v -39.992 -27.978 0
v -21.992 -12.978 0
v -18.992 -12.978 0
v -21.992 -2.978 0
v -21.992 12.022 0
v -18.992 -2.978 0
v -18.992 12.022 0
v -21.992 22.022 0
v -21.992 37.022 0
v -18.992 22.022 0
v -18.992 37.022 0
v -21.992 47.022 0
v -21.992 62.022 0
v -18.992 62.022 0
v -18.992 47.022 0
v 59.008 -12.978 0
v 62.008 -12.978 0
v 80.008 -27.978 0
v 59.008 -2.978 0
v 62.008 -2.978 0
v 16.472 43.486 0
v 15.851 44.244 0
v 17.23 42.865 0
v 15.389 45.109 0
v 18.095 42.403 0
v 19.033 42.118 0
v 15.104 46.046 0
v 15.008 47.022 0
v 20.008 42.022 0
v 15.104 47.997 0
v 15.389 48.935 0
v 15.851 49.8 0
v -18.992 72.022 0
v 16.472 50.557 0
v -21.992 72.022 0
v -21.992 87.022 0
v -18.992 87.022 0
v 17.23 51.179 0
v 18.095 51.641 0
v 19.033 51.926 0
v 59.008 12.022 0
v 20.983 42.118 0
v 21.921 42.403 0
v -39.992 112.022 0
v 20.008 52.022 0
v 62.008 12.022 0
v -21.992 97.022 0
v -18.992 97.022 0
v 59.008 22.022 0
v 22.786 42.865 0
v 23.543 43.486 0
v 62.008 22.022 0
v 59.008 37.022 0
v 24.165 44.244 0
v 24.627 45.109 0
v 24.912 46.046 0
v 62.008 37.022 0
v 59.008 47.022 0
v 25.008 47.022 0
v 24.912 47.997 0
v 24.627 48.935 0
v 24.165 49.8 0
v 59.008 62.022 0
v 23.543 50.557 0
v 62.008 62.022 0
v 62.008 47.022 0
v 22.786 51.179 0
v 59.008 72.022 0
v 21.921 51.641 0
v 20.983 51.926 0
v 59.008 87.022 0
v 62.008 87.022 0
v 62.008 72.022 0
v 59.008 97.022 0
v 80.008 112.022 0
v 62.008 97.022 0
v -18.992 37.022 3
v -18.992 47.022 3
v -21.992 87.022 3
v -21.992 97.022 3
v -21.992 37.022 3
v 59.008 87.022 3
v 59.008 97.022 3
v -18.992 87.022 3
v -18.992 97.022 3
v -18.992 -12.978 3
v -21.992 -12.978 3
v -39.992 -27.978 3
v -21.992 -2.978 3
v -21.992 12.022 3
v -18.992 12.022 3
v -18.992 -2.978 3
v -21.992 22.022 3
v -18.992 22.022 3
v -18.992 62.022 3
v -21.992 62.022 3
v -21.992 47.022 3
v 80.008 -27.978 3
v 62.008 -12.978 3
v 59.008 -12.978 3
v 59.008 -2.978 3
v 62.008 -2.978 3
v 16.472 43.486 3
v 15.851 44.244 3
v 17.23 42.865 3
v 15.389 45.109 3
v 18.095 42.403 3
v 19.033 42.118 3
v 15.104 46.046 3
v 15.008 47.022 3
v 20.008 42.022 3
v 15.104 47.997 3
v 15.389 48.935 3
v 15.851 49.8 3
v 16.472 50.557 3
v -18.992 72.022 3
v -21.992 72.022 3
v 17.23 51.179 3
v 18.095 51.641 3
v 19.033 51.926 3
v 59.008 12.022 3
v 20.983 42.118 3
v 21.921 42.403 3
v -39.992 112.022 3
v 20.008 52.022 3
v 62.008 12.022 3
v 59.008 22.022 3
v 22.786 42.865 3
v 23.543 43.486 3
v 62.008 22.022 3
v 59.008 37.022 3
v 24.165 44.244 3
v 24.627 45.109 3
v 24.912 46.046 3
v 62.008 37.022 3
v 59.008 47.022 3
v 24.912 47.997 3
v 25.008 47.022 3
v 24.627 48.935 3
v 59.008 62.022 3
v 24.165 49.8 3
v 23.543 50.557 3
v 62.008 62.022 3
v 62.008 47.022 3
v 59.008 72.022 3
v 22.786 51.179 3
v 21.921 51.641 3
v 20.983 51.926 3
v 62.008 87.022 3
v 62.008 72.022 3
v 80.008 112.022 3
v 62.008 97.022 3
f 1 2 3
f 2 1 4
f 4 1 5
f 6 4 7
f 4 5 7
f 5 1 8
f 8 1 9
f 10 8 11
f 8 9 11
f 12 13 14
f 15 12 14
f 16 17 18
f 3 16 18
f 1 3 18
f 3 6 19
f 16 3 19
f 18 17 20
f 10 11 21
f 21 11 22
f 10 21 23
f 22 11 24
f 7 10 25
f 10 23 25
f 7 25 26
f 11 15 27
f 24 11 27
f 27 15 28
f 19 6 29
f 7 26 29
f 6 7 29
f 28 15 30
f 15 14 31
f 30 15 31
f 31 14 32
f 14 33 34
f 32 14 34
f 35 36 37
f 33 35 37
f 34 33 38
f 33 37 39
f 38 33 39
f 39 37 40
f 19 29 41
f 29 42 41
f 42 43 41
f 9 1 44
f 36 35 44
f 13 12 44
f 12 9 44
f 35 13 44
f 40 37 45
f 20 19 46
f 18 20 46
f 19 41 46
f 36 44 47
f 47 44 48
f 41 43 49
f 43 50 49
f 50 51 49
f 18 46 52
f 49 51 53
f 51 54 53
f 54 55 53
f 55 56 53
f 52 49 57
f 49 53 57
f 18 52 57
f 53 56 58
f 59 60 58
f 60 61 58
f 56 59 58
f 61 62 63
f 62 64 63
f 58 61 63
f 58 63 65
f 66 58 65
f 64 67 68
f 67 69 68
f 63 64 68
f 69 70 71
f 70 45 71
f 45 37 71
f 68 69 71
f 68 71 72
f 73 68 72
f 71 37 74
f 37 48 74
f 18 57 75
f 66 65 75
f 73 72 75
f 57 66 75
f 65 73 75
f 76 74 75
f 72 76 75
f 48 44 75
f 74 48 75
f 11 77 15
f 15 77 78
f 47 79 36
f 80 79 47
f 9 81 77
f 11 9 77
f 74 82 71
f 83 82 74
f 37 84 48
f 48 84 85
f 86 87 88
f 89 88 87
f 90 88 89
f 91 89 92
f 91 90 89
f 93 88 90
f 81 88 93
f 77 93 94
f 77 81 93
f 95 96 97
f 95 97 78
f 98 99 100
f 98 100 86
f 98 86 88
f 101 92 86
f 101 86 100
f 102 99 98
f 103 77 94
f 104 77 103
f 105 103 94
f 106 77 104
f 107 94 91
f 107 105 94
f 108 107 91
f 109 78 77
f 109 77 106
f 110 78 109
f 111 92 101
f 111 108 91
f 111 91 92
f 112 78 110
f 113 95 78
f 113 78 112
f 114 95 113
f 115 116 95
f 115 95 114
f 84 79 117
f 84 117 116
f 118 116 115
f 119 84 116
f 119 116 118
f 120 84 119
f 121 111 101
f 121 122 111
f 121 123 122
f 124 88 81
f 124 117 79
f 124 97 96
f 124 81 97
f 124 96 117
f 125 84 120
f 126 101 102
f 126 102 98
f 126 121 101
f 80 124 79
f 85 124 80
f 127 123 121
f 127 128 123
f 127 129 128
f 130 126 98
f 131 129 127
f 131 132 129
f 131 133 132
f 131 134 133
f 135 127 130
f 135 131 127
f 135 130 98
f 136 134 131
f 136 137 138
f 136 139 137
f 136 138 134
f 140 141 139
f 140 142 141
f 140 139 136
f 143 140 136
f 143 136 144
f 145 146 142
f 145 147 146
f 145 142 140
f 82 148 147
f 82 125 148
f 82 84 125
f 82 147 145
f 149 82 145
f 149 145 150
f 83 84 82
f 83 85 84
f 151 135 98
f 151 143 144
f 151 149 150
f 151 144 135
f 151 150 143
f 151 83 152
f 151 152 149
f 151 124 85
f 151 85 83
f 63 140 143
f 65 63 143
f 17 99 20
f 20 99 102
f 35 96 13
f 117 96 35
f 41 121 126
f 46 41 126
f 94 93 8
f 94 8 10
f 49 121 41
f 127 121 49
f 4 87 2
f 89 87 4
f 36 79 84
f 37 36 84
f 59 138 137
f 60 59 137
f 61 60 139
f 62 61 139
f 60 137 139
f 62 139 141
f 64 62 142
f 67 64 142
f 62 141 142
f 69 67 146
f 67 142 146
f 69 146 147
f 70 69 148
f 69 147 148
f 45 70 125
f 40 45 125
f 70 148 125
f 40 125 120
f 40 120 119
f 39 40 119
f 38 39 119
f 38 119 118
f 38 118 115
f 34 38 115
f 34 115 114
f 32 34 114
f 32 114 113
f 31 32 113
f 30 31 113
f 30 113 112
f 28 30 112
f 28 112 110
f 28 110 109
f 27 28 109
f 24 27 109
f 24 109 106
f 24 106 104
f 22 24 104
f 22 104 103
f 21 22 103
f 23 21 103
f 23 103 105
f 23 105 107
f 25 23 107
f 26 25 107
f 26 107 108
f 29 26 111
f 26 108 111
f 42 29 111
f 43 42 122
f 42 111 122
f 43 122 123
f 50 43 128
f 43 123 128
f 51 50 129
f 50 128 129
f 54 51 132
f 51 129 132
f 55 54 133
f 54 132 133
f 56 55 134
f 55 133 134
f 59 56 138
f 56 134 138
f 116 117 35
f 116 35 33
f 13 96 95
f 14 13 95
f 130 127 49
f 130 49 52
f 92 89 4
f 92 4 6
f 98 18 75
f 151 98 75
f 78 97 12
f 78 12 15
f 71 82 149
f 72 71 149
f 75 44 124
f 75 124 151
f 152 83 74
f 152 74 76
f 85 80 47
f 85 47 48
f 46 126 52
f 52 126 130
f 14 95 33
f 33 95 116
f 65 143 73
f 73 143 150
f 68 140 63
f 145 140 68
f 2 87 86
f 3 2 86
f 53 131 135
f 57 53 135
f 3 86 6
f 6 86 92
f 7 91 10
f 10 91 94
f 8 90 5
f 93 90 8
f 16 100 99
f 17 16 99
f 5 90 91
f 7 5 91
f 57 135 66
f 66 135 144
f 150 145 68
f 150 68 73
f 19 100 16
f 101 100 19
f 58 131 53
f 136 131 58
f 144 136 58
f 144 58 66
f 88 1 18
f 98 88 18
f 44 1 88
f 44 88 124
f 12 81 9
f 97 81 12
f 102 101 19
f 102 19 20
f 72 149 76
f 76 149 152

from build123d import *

# Parameters (mm, degrees)
ESQUISSE1_W             = 120
ESQUISSE1_H             = 140
BOSS_EXTRU_1_DEPTH      = 3
ESQUISSE3_R             = 5
ESQUISSE3_W             = 3
ESQUISSE3_H             = 10
ENL_V_MAT_EXTRU_1_DEPTH = 138.692369665


with BuildPart() as part:
    # Esquisse1 → Boss.-Extru.1 (new body)
    with BuildSketch(Plane.XY):
        with Locations((20.007954742, 42.021943574)):
            Rectangle(ESQUISSE1_W, ESQUISSE1_H)
    extrude(amount=BOSS_EXTRU_1_DEPTH)

    # Esquisse3 → Enlèv. mat.-Extru.1 (cut, through all)
    with BuildSketch(Plane.XY.offset(3)):
        with Locations((20.007954742, 47.021943574)):
            Circle(ESQUISSE3_R)
        with Locations((-20.492045258, 67.021943574)):
            Rectangle(ESQUISSE3_W, ESQUISSE3_H)
        with Locations((-20.492045258, 92.021943574)):
            Rectangle(ESQUISSE3_W, ESQUISSE3_H)
        with Locations((-20.492045258, -7.978056426)):
            Rectangle(ESQUISSE3_W, ESQUISSE3_H)
        with Locations((-20.492045258, 42.021943574)):
            Rectangle(ESQUISSE3_W, ESQUISSE3_H)
        with Locations((-20.492045258, 17.021943574)):
            Rectangle(ESQUISSE3_W, ESQUISSE3_H)
        with Locations((60.507954742, -7.978056426)):
            Rectangle(ESQUISSE3_W, ESQUISSE3_H)
        with Locations((60.507954742, 17.021943574)):
            Rectangle(ESQUISSE3_W, ESQUISSE3_H)
        with Locations((60.507954742, 42.021943574)):
            Rectangle(ESQUISSE3_W, ESQUISSE3_H)
        with Locations((60.507954742, 67.021943574)):
            Rectangle(ESQUISSE3_W, ESQUISSE3_H)
        with Locations((60.507954742, 92.021943574)):
            Rectangle(ESQUISSE3_W, ESQUISSE3_H)
    extrude(amount=-ENL_V_MAT_EXTRU_1_DEPTH, mode=Mode.SUBTRACT)


solid = part.part
